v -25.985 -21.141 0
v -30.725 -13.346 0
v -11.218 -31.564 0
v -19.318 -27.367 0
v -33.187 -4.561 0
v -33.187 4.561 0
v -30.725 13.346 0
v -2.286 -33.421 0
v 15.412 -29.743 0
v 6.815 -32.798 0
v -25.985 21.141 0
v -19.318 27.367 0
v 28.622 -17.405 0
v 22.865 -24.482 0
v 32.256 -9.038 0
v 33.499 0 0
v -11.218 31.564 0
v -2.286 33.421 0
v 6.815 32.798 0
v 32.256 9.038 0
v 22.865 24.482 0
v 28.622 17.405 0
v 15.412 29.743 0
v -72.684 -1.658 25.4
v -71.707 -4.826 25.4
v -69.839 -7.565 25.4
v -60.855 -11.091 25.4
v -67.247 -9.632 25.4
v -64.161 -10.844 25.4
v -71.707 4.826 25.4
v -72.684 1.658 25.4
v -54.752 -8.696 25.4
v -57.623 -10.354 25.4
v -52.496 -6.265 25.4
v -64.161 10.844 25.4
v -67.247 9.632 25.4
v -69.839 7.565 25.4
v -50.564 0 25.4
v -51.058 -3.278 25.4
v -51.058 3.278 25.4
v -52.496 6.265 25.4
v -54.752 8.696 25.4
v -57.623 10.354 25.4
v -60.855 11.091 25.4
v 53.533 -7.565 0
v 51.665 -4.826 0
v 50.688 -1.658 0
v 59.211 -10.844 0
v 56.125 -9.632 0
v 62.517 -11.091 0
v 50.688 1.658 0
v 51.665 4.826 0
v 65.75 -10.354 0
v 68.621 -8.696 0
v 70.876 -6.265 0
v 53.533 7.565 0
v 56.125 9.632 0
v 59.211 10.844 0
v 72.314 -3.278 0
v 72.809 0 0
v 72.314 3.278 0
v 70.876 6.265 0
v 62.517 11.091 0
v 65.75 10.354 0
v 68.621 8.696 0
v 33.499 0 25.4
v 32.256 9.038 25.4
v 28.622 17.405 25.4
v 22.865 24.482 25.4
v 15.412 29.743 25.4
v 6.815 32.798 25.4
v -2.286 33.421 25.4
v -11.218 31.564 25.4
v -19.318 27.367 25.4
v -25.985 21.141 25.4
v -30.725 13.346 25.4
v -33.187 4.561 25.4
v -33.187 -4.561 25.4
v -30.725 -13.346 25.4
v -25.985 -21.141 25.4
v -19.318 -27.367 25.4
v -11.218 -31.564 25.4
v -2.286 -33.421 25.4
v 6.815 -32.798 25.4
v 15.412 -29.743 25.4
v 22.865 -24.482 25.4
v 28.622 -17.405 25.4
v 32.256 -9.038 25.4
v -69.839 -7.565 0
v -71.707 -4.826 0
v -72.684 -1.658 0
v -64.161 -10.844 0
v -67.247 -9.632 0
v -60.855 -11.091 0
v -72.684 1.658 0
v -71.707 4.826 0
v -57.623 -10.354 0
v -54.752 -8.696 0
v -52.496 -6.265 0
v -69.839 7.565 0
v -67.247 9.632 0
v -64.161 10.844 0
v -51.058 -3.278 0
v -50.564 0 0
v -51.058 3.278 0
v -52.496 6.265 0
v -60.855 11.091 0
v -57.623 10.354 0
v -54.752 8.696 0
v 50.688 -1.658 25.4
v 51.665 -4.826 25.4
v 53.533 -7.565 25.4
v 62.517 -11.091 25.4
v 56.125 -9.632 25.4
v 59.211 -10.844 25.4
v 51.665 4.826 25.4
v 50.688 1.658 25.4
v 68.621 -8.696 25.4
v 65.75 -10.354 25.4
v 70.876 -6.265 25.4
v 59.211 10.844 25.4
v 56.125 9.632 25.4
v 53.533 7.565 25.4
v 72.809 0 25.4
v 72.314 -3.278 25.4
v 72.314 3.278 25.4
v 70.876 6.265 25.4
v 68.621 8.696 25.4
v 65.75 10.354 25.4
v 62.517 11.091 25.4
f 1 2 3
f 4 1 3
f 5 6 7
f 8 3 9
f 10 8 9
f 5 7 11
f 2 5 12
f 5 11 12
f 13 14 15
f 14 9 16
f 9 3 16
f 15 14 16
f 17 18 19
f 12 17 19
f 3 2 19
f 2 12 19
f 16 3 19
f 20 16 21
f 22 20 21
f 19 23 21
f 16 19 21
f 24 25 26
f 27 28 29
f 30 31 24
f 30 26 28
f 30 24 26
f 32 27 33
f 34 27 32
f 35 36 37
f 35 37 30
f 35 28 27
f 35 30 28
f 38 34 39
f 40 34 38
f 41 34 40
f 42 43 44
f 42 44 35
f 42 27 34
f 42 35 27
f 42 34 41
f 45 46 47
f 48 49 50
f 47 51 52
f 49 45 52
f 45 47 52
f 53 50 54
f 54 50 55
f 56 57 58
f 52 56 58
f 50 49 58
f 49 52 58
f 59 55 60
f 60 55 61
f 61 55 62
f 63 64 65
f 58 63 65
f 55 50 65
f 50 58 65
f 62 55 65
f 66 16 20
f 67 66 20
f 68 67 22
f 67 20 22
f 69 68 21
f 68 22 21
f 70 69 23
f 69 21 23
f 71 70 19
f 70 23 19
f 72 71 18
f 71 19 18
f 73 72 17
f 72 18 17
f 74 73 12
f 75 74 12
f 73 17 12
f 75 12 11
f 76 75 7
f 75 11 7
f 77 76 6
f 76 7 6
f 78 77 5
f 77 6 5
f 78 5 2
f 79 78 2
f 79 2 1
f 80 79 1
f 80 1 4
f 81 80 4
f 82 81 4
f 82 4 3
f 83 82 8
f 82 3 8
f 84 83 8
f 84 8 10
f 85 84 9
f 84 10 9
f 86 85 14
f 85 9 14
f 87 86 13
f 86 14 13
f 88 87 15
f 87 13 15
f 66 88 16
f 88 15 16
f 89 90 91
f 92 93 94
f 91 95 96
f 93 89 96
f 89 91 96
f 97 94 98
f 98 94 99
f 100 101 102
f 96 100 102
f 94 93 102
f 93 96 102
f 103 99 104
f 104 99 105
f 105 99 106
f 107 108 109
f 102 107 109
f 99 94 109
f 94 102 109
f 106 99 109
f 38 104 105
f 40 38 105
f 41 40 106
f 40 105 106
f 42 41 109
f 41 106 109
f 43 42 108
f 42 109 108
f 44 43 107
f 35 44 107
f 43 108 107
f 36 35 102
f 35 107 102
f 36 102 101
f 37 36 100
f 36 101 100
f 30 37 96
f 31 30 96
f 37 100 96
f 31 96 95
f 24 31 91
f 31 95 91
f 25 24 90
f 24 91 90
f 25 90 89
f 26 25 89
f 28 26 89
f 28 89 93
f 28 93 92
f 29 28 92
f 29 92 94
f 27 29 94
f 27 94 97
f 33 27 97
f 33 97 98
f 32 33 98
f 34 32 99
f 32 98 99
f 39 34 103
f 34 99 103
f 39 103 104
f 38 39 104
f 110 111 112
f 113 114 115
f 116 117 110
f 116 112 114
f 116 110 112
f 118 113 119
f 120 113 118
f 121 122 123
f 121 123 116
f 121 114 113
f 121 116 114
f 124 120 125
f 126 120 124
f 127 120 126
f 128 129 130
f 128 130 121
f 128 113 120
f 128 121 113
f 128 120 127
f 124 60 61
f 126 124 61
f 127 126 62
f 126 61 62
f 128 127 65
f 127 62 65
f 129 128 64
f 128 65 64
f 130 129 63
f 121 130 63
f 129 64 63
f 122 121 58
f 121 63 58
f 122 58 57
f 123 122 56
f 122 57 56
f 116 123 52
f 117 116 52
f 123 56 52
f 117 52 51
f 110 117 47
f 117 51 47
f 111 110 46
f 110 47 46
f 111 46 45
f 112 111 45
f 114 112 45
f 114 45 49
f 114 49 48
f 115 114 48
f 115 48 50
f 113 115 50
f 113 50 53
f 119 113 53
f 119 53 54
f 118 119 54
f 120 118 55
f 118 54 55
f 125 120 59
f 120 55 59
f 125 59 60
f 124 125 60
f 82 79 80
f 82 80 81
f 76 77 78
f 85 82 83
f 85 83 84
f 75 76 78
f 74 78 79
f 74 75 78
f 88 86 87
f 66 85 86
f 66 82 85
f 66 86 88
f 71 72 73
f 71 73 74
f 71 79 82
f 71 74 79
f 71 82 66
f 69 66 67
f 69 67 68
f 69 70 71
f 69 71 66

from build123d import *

# Parameters (mm, degrees)
F0_R     = 33.498619
F0_R_2   = 11.122365
F1_DEPTH = 25.4


with BuildPart() as f1:
    # F0 (on Top) → F1 (new body)
    with BuildSketch(Plane.XY):
        Circle(F0_R)
        with Locations((-61.686184, 0)):
            Circle(F0_R_2)
        with Locations((61.686184, 0)):
            Circle(F0_R_2)
    extrude(amount=F1_DEPTH)


solid = f1.part
